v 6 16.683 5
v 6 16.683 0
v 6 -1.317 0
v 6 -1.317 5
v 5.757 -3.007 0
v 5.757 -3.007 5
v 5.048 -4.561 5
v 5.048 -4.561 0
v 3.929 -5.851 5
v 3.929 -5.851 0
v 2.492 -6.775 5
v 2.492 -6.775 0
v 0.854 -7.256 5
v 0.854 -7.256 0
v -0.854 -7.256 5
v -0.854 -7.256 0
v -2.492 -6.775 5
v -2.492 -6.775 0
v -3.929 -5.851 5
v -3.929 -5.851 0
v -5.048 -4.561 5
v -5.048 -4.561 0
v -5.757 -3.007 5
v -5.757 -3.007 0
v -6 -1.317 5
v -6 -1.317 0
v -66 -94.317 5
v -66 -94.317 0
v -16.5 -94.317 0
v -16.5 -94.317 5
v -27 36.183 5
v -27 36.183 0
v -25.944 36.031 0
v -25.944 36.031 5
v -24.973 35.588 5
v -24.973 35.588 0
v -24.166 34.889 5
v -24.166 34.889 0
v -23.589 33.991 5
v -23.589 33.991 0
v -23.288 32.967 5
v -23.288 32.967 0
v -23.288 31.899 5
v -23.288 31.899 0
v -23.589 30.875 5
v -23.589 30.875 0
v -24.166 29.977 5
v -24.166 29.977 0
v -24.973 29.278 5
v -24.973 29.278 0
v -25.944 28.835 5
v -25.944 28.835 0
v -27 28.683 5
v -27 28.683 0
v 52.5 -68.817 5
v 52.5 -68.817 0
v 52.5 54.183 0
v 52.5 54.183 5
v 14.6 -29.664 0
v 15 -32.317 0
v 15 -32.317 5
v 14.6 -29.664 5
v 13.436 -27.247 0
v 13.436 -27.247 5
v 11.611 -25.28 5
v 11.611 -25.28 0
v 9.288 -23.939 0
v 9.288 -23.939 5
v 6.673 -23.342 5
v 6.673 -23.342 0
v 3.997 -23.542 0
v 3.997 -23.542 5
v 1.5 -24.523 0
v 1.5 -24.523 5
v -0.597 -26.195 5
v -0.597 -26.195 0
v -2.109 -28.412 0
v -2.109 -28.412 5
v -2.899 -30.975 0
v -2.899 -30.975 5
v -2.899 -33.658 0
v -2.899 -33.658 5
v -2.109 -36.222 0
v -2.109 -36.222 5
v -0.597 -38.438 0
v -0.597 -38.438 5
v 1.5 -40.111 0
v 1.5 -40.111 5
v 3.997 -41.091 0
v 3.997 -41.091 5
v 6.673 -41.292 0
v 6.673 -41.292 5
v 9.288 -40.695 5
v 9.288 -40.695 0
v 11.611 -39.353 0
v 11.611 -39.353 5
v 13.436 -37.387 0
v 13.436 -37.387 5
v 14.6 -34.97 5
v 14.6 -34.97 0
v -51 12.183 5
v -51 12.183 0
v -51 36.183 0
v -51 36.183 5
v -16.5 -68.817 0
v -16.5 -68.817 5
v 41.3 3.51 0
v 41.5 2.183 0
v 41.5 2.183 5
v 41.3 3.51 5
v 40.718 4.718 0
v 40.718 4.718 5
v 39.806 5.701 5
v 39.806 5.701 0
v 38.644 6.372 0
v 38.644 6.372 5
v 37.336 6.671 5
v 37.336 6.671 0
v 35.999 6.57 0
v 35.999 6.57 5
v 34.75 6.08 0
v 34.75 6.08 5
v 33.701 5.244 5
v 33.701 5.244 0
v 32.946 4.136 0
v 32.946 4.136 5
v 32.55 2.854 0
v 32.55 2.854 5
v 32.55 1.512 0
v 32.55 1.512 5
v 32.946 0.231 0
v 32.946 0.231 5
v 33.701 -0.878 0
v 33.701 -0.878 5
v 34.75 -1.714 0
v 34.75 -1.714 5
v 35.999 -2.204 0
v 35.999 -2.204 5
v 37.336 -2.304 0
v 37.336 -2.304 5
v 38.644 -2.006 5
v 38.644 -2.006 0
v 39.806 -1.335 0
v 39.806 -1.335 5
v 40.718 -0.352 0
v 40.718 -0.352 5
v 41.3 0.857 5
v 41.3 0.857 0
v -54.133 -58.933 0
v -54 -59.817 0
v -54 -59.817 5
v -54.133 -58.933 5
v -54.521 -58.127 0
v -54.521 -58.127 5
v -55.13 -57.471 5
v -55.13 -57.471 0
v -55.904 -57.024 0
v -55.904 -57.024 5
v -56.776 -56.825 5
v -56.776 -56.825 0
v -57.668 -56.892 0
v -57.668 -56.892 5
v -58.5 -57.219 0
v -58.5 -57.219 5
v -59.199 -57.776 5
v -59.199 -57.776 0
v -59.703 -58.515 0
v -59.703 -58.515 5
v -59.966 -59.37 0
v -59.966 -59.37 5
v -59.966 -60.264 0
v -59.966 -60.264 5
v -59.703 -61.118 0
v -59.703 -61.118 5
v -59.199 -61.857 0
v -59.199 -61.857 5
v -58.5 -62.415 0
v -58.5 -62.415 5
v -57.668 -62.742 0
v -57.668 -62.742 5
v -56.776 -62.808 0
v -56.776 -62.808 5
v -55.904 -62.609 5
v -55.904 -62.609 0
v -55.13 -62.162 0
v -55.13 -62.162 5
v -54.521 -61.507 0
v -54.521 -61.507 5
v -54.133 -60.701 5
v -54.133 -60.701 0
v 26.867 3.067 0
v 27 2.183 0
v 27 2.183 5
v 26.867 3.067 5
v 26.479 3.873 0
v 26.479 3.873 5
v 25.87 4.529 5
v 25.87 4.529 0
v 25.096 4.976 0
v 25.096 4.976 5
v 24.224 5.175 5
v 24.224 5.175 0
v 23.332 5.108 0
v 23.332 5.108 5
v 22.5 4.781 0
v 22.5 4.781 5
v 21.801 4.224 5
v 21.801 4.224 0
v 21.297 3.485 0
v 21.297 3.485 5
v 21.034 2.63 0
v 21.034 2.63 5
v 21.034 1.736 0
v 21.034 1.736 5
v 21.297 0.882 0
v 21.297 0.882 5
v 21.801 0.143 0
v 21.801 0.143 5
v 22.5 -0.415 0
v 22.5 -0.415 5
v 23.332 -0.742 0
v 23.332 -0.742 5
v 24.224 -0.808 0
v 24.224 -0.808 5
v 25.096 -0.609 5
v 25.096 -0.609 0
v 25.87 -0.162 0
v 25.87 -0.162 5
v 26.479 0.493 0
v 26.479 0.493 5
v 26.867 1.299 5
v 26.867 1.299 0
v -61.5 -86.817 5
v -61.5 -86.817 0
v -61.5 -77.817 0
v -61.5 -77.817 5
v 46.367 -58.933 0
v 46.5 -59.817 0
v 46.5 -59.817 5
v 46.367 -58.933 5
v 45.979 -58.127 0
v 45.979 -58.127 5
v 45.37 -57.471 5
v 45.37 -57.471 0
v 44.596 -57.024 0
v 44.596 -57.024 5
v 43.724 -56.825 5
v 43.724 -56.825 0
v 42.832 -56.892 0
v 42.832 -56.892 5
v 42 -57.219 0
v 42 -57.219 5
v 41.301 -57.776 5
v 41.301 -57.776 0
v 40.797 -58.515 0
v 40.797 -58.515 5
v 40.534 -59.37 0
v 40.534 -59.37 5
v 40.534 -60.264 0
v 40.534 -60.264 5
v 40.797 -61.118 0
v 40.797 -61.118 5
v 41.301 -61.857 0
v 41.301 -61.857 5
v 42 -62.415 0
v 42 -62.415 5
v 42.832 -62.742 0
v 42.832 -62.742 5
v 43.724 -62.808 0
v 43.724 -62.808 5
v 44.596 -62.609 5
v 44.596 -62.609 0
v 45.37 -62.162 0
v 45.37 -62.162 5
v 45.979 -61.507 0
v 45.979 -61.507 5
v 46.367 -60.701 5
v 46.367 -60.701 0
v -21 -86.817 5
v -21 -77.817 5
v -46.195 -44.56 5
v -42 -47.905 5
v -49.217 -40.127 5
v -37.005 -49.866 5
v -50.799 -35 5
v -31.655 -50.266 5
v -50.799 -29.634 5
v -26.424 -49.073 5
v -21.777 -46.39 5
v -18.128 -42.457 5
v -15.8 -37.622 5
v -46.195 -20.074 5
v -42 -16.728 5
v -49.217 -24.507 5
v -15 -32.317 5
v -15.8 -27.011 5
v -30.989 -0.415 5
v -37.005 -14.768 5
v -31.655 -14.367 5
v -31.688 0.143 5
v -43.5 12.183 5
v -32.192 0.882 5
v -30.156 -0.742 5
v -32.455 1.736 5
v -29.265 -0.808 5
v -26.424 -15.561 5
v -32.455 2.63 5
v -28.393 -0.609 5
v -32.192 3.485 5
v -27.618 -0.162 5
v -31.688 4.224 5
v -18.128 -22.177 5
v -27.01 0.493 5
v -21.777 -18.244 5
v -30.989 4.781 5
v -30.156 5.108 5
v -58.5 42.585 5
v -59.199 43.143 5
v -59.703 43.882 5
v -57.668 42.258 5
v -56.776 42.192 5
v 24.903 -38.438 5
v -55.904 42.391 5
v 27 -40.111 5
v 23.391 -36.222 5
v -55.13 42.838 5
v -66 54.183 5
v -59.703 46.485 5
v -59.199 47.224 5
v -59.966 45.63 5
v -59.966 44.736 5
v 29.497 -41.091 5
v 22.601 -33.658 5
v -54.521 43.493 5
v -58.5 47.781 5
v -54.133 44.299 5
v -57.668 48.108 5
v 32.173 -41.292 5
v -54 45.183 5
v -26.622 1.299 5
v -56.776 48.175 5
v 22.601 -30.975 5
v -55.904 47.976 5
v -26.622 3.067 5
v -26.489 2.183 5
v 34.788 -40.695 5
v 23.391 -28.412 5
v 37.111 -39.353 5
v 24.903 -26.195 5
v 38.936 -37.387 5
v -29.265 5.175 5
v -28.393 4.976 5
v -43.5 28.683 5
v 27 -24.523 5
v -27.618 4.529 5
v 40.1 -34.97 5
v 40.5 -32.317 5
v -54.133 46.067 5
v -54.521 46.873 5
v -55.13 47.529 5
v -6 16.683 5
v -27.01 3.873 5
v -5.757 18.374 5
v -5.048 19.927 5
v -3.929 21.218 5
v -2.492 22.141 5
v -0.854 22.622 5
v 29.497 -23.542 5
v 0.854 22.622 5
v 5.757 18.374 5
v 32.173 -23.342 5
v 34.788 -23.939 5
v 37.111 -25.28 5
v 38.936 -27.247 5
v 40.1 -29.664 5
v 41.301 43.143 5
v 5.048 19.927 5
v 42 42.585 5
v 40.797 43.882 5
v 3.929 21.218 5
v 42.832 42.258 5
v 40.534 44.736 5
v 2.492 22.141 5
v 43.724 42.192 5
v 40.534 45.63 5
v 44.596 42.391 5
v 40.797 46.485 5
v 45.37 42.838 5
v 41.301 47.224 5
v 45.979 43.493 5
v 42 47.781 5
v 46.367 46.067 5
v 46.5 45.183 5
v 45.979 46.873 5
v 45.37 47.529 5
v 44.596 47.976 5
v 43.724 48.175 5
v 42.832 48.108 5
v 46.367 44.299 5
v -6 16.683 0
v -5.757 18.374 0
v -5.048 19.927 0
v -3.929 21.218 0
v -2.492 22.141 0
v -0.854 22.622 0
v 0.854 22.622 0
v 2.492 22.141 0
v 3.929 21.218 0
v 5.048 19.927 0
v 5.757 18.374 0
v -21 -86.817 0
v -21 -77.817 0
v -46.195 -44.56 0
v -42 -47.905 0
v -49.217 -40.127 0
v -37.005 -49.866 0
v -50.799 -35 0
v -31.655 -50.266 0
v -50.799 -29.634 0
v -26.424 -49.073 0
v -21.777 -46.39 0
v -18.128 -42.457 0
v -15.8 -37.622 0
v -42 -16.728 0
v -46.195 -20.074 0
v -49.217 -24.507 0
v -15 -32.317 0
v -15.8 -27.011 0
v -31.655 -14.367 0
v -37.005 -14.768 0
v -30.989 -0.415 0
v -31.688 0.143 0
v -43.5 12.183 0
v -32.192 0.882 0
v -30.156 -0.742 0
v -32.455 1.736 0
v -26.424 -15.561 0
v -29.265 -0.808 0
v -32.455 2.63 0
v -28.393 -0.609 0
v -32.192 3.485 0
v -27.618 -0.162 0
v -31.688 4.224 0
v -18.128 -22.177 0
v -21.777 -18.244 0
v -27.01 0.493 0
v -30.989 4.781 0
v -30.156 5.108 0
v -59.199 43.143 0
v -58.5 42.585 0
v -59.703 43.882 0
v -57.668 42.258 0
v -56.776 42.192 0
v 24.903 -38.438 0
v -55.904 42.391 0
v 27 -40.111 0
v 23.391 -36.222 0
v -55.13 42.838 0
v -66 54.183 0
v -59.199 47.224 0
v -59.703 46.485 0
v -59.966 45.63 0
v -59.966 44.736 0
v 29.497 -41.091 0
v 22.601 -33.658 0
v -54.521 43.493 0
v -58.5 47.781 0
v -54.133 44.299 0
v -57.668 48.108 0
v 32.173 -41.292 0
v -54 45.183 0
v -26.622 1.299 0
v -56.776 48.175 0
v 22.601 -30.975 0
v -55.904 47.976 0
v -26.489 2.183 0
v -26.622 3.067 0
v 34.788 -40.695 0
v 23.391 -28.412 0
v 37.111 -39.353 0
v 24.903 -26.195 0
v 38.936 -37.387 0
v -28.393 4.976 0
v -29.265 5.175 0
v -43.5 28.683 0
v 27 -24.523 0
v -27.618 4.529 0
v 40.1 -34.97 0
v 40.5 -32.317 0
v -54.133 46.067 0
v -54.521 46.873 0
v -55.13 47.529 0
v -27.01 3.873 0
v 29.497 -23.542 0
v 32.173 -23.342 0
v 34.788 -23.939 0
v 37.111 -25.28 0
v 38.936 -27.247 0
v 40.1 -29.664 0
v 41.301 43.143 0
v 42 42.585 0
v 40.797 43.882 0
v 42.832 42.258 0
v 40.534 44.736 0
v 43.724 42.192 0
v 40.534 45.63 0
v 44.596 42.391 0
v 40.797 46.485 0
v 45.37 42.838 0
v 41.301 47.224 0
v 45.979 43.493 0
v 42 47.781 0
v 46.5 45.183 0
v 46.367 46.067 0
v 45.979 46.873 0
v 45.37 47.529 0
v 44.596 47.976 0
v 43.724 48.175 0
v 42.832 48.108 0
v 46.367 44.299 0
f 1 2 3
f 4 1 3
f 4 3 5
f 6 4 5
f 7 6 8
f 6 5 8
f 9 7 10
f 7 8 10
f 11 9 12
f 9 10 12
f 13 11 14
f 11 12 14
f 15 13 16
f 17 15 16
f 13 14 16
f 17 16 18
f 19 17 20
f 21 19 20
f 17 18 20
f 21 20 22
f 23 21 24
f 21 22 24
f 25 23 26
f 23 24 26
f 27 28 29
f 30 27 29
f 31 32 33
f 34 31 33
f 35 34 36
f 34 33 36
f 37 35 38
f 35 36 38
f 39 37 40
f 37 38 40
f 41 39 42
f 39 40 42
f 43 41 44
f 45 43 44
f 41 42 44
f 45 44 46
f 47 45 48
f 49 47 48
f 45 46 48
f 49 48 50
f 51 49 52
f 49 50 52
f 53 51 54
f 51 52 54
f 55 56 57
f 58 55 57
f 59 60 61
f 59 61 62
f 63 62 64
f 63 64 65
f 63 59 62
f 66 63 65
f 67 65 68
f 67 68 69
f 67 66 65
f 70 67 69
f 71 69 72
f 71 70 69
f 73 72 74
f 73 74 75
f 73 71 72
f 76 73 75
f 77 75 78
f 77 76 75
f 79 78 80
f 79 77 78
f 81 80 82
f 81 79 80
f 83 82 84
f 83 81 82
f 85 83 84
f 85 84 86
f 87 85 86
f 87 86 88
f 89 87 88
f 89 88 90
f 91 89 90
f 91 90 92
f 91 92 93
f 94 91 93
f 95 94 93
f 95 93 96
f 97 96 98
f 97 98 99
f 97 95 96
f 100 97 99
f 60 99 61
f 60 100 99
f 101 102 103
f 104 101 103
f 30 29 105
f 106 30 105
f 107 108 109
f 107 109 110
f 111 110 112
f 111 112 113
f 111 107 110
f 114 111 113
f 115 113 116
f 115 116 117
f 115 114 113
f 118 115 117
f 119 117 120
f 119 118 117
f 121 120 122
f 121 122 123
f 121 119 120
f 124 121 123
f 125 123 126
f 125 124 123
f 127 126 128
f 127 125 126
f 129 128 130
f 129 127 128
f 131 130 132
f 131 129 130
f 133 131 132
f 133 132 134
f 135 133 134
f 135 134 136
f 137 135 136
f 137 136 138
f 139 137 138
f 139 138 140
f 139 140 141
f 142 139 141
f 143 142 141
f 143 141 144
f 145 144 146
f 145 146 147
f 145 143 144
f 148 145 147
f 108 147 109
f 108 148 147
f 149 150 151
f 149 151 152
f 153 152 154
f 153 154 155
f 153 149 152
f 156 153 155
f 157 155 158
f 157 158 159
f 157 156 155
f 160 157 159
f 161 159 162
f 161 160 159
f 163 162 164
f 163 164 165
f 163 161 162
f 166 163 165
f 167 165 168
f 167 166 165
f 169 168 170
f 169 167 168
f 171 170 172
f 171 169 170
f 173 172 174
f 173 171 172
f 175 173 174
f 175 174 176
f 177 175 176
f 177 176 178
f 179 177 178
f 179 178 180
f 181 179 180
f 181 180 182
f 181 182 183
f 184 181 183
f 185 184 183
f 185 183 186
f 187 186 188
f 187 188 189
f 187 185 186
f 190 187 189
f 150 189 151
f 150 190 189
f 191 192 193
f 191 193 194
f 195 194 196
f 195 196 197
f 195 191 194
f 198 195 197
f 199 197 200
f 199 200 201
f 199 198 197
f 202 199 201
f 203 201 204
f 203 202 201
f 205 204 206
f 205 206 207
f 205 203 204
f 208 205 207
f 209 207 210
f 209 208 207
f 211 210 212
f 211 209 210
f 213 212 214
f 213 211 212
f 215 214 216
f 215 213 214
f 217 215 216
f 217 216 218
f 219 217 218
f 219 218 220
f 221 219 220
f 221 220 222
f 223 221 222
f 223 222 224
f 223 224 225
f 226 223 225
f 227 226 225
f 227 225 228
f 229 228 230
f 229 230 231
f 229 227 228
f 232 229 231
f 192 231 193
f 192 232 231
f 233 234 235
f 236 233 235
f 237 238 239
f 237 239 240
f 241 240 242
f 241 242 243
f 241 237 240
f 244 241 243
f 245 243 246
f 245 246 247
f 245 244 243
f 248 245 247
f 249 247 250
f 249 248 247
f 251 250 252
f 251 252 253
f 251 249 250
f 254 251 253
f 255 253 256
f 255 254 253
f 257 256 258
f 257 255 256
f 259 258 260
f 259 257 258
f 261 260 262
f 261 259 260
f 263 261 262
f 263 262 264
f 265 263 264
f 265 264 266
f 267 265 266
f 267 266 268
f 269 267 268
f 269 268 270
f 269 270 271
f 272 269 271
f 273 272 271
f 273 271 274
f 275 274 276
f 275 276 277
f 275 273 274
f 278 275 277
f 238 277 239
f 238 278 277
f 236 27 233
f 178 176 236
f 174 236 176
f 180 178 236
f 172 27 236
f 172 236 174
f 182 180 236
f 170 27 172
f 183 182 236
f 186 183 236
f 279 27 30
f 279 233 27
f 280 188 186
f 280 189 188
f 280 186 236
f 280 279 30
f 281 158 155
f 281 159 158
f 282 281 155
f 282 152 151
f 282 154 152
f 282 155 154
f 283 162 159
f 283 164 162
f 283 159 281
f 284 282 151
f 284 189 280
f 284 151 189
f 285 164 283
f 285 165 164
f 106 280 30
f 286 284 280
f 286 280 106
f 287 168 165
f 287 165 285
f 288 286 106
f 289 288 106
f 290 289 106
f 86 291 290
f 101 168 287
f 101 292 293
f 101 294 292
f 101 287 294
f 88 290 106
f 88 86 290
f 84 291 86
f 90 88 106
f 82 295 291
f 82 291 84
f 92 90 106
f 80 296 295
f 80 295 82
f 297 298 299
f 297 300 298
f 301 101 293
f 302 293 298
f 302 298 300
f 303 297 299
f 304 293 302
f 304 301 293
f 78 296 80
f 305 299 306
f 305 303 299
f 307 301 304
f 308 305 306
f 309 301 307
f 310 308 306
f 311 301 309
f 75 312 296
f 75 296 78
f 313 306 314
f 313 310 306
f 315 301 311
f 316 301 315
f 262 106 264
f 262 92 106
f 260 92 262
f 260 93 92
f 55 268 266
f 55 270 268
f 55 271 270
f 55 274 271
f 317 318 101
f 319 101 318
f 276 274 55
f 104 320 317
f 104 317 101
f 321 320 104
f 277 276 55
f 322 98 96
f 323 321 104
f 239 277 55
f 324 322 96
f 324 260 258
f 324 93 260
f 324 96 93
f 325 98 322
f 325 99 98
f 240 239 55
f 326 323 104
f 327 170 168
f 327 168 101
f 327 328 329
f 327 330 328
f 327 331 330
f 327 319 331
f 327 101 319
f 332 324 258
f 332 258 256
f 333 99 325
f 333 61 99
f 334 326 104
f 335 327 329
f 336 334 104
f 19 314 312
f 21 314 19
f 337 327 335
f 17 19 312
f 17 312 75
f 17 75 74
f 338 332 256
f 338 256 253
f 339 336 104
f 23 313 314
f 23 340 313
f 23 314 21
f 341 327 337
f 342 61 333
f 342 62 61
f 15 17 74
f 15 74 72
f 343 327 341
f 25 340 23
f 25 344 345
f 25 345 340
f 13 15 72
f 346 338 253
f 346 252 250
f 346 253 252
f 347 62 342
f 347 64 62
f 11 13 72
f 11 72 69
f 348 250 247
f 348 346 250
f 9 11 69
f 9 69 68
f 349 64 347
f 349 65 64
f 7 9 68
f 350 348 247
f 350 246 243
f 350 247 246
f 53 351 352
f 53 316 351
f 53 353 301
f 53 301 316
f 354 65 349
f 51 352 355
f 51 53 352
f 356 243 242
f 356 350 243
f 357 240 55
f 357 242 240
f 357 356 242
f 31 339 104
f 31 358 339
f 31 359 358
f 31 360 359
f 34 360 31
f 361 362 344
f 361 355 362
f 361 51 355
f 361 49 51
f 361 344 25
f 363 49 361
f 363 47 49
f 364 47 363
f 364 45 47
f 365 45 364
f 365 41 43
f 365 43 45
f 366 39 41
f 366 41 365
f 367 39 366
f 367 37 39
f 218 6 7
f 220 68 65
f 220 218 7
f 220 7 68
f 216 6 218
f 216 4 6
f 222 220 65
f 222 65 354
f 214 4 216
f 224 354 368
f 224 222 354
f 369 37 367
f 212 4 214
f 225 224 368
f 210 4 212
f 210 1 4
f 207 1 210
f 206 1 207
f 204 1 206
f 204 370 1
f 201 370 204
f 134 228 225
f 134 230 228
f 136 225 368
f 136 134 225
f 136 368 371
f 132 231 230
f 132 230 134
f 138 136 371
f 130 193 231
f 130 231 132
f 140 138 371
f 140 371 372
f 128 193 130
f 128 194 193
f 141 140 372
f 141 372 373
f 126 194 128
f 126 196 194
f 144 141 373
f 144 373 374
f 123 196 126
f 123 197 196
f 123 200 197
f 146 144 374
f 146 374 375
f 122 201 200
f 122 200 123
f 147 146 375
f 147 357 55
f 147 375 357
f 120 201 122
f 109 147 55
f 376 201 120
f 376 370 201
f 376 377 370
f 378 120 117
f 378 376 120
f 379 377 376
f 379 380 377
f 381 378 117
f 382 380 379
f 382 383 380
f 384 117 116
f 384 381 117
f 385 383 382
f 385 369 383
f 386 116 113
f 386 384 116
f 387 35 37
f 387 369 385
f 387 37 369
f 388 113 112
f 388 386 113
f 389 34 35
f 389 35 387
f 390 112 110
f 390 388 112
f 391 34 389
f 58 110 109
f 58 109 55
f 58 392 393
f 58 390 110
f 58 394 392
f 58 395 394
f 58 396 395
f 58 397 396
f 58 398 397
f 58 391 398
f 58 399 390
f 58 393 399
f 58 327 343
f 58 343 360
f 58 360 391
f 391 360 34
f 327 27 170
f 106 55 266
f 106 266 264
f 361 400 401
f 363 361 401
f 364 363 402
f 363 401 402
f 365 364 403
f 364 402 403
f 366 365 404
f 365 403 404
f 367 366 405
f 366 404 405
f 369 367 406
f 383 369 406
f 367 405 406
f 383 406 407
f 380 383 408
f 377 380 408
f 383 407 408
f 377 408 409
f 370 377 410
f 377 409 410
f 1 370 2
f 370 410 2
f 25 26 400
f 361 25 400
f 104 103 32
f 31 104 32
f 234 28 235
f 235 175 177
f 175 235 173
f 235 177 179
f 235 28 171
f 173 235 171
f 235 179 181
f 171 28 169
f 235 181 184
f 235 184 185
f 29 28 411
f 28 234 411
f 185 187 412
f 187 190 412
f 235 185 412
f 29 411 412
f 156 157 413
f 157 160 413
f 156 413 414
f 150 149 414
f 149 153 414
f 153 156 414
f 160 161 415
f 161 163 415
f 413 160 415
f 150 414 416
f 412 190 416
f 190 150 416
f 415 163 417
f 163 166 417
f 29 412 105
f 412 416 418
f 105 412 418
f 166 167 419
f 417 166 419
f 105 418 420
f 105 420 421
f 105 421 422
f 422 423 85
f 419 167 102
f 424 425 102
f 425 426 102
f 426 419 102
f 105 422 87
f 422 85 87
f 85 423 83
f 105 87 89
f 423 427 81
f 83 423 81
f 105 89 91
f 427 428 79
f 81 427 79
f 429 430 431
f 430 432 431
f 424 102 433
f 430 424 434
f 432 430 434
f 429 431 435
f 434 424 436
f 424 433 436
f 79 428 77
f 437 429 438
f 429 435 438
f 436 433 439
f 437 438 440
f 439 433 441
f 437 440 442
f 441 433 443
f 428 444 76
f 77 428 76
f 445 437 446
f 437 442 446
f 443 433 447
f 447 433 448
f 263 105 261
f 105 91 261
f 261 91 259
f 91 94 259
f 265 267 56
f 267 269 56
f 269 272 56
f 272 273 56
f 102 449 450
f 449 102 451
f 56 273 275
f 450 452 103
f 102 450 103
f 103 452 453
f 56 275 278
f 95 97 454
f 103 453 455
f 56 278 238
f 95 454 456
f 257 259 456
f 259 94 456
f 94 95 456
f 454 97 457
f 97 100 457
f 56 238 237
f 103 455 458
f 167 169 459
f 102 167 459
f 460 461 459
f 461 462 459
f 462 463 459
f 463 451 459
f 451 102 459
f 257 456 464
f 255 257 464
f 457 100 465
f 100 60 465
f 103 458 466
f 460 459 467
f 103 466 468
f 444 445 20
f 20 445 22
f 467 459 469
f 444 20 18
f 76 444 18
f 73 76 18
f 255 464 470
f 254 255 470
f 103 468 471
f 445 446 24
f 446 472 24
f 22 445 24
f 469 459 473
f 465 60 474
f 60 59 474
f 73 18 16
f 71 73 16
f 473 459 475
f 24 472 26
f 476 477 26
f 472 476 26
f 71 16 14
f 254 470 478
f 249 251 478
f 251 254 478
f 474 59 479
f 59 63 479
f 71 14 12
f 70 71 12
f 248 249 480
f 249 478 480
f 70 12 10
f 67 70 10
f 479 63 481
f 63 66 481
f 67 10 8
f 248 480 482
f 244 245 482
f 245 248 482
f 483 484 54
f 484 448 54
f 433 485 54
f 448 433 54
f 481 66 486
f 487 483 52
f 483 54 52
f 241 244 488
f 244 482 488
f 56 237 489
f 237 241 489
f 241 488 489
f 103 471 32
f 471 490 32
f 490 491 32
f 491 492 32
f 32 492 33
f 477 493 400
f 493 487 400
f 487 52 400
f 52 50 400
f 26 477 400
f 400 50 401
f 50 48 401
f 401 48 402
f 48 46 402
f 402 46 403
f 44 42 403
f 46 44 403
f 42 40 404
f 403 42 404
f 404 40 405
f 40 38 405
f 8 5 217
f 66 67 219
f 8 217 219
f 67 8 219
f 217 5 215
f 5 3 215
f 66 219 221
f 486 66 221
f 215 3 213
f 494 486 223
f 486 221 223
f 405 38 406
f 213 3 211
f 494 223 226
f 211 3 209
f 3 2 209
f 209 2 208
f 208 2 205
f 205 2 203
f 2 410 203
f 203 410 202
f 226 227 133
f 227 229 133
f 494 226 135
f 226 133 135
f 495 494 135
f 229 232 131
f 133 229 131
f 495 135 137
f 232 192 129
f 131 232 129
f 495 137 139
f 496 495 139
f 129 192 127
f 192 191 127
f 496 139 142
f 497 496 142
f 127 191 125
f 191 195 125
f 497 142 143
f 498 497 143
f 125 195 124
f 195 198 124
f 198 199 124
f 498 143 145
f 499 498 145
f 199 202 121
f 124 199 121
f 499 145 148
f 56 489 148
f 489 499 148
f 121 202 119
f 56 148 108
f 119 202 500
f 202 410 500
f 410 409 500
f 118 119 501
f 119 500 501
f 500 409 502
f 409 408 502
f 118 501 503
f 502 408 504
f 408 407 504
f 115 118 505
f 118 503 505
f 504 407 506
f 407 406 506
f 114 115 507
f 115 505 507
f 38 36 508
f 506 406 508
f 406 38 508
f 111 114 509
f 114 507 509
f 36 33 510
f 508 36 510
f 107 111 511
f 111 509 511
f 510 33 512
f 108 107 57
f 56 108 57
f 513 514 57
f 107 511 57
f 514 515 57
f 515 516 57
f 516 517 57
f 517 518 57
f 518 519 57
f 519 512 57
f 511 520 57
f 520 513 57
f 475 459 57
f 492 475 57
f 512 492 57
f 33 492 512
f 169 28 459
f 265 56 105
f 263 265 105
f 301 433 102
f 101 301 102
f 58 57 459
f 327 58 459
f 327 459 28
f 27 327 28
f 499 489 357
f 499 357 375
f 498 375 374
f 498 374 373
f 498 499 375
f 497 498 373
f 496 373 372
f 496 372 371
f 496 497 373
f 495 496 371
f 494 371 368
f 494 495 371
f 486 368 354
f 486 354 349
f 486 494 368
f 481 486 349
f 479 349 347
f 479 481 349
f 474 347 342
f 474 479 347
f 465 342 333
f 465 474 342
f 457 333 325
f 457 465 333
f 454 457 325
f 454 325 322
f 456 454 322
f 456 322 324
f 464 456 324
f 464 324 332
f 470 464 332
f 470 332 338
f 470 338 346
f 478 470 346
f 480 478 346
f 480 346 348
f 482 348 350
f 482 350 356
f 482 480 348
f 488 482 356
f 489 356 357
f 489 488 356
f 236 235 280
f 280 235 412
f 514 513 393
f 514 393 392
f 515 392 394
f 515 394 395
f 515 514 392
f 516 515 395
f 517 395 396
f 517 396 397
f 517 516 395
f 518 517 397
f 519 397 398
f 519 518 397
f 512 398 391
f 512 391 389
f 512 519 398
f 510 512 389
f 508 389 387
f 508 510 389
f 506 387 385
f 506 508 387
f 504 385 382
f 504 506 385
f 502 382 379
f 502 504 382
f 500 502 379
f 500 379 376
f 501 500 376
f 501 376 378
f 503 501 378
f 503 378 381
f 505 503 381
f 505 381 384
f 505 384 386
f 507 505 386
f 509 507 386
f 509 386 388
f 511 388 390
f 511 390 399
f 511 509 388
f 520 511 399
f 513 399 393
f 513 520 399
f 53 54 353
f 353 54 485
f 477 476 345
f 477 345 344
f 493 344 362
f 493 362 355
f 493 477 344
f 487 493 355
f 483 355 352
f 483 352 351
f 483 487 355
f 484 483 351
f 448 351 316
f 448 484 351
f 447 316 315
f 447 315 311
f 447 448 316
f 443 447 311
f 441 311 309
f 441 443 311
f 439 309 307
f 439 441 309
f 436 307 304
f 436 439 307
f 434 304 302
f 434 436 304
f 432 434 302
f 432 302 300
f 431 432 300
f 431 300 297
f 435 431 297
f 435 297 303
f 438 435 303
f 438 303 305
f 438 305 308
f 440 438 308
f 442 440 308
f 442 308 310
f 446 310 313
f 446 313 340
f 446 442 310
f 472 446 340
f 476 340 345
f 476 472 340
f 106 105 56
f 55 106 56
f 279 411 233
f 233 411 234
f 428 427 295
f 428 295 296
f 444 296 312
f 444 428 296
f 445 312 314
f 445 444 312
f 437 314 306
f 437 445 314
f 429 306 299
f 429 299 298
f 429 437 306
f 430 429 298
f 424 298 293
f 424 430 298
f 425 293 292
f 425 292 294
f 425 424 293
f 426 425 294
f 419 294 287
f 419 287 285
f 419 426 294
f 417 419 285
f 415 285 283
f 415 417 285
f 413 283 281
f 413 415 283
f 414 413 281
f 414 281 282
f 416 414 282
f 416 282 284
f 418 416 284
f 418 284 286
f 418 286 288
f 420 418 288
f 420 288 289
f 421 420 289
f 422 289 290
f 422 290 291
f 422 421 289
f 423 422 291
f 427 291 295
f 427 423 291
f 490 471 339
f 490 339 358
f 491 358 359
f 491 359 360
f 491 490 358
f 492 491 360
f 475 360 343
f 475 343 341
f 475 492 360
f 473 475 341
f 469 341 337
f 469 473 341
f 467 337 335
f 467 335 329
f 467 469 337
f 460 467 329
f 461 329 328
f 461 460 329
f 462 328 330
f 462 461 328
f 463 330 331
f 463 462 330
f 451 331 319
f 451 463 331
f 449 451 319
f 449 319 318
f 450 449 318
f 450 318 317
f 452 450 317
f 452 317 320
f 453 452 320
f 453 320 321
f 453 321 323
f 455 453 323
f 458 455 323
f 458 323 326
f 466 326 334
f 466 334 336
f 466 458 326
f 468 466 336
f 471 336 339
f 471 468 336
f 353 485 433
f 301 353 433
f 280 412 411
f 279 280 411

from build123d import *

# Parameters (mm, degrees)
F0_R     = 3
F0_R_2   = 18
F0_R_3   = 9
F0_R_4   = 4.5
F1_DEPTH = 5


with BuildPart() as f1:
    # F0 (on Top) → F1 (new body)
    with BuildSketch(Plane.XY):
        Polygon((52.5, 54.183173), (-66, 54.183173), (-66, -68.816827), (-66, -94.316827), (-16.5, -94.316827), (-16.5, -68.816827), (52.5, -68.816827), align=None)
        Polygon((-61.5, -86.816827), (-61.5, -77.816827), (-52.5, -77.816827), (-45, -77.816827), (-36, -77.816827), (-30, -77.816827), (-21, -77.816827), (-21, -86.816827), (-30, -86.816827), (-36, -86.816827), (-45, -86.816827), (-52.5, -86.816827), align=None, mode=Mode.SUBTRACT)
        with Locations((-57, -59.816827)):
            Circle(F0_R, mode=Mode.SUBTRACT)
        with Locations((-33, -32.316827)):
            Circle(F0_R_2, mode=Mode.SUBTRACT)
        with Locations((43.5, -59.816827)):
            Circle(F0_R, mode=Mode.SUBTRACT)
        with Locations((6, -32.316827)):
            Circle(F0_R_3, mode=Mode.SUBTRACT)
        with Locations((31.5, -32.316827)):
            Circle(F0_R_3, mode=Mode.SUBTRACT)
        with Locations((-29.488925, 2.183173)):
            Circle(F0_R, mode=Mode.SUBTRACT)
        with BuildLine():
            Line((-51, 12.183173), (-51, 36.183173))
            Line((-51, 36.183173), (-27, 36.183173))
            ThreePointArc((-27, 36.183173), (-23.25, 32.433173), (-27, 28.683173))
            Line((-27, 28.683173), (-43.5, 28.683173))
            Line((-43.5, 28.683173), (-43.5, 12.183173))
            Line((-43.5, 12.183173), (-51, 12.183173))
        make_face(mode=Mode.SUBTRACT)
        with Locations((-57, 45.183173)):
            Circle(F0_R, mode=Mode.SUBTRACT)
        with BuildLine():
            Line((-6, -1.316827), (-6, 16.683173))
            ThreePointArc((-6, 16.683173), (0, 22.683173), (6, 16.683173))
            Line((6, 16.683173), (6, -1.316827))
            ThreePointArc((6, -1.316827), (0, -7.316827), (-6, -1.316827))
        make_face(mode=Mode.SUBTRACT)
        with Locations((24, 2.183173)):
            Circle(F0_R, mode=Mode.SUBTRACT)
        with Locations((37, 2.183173)):
            Circle(F0_R_4, mode=Mode.SUBTRACT)
        with Locations((43.5, 45.183173)):
            Circle(F0_R, mode=Mode.SUBTRACT)
    extrude(amount=F1_DEPTH)


solid = f1.part
